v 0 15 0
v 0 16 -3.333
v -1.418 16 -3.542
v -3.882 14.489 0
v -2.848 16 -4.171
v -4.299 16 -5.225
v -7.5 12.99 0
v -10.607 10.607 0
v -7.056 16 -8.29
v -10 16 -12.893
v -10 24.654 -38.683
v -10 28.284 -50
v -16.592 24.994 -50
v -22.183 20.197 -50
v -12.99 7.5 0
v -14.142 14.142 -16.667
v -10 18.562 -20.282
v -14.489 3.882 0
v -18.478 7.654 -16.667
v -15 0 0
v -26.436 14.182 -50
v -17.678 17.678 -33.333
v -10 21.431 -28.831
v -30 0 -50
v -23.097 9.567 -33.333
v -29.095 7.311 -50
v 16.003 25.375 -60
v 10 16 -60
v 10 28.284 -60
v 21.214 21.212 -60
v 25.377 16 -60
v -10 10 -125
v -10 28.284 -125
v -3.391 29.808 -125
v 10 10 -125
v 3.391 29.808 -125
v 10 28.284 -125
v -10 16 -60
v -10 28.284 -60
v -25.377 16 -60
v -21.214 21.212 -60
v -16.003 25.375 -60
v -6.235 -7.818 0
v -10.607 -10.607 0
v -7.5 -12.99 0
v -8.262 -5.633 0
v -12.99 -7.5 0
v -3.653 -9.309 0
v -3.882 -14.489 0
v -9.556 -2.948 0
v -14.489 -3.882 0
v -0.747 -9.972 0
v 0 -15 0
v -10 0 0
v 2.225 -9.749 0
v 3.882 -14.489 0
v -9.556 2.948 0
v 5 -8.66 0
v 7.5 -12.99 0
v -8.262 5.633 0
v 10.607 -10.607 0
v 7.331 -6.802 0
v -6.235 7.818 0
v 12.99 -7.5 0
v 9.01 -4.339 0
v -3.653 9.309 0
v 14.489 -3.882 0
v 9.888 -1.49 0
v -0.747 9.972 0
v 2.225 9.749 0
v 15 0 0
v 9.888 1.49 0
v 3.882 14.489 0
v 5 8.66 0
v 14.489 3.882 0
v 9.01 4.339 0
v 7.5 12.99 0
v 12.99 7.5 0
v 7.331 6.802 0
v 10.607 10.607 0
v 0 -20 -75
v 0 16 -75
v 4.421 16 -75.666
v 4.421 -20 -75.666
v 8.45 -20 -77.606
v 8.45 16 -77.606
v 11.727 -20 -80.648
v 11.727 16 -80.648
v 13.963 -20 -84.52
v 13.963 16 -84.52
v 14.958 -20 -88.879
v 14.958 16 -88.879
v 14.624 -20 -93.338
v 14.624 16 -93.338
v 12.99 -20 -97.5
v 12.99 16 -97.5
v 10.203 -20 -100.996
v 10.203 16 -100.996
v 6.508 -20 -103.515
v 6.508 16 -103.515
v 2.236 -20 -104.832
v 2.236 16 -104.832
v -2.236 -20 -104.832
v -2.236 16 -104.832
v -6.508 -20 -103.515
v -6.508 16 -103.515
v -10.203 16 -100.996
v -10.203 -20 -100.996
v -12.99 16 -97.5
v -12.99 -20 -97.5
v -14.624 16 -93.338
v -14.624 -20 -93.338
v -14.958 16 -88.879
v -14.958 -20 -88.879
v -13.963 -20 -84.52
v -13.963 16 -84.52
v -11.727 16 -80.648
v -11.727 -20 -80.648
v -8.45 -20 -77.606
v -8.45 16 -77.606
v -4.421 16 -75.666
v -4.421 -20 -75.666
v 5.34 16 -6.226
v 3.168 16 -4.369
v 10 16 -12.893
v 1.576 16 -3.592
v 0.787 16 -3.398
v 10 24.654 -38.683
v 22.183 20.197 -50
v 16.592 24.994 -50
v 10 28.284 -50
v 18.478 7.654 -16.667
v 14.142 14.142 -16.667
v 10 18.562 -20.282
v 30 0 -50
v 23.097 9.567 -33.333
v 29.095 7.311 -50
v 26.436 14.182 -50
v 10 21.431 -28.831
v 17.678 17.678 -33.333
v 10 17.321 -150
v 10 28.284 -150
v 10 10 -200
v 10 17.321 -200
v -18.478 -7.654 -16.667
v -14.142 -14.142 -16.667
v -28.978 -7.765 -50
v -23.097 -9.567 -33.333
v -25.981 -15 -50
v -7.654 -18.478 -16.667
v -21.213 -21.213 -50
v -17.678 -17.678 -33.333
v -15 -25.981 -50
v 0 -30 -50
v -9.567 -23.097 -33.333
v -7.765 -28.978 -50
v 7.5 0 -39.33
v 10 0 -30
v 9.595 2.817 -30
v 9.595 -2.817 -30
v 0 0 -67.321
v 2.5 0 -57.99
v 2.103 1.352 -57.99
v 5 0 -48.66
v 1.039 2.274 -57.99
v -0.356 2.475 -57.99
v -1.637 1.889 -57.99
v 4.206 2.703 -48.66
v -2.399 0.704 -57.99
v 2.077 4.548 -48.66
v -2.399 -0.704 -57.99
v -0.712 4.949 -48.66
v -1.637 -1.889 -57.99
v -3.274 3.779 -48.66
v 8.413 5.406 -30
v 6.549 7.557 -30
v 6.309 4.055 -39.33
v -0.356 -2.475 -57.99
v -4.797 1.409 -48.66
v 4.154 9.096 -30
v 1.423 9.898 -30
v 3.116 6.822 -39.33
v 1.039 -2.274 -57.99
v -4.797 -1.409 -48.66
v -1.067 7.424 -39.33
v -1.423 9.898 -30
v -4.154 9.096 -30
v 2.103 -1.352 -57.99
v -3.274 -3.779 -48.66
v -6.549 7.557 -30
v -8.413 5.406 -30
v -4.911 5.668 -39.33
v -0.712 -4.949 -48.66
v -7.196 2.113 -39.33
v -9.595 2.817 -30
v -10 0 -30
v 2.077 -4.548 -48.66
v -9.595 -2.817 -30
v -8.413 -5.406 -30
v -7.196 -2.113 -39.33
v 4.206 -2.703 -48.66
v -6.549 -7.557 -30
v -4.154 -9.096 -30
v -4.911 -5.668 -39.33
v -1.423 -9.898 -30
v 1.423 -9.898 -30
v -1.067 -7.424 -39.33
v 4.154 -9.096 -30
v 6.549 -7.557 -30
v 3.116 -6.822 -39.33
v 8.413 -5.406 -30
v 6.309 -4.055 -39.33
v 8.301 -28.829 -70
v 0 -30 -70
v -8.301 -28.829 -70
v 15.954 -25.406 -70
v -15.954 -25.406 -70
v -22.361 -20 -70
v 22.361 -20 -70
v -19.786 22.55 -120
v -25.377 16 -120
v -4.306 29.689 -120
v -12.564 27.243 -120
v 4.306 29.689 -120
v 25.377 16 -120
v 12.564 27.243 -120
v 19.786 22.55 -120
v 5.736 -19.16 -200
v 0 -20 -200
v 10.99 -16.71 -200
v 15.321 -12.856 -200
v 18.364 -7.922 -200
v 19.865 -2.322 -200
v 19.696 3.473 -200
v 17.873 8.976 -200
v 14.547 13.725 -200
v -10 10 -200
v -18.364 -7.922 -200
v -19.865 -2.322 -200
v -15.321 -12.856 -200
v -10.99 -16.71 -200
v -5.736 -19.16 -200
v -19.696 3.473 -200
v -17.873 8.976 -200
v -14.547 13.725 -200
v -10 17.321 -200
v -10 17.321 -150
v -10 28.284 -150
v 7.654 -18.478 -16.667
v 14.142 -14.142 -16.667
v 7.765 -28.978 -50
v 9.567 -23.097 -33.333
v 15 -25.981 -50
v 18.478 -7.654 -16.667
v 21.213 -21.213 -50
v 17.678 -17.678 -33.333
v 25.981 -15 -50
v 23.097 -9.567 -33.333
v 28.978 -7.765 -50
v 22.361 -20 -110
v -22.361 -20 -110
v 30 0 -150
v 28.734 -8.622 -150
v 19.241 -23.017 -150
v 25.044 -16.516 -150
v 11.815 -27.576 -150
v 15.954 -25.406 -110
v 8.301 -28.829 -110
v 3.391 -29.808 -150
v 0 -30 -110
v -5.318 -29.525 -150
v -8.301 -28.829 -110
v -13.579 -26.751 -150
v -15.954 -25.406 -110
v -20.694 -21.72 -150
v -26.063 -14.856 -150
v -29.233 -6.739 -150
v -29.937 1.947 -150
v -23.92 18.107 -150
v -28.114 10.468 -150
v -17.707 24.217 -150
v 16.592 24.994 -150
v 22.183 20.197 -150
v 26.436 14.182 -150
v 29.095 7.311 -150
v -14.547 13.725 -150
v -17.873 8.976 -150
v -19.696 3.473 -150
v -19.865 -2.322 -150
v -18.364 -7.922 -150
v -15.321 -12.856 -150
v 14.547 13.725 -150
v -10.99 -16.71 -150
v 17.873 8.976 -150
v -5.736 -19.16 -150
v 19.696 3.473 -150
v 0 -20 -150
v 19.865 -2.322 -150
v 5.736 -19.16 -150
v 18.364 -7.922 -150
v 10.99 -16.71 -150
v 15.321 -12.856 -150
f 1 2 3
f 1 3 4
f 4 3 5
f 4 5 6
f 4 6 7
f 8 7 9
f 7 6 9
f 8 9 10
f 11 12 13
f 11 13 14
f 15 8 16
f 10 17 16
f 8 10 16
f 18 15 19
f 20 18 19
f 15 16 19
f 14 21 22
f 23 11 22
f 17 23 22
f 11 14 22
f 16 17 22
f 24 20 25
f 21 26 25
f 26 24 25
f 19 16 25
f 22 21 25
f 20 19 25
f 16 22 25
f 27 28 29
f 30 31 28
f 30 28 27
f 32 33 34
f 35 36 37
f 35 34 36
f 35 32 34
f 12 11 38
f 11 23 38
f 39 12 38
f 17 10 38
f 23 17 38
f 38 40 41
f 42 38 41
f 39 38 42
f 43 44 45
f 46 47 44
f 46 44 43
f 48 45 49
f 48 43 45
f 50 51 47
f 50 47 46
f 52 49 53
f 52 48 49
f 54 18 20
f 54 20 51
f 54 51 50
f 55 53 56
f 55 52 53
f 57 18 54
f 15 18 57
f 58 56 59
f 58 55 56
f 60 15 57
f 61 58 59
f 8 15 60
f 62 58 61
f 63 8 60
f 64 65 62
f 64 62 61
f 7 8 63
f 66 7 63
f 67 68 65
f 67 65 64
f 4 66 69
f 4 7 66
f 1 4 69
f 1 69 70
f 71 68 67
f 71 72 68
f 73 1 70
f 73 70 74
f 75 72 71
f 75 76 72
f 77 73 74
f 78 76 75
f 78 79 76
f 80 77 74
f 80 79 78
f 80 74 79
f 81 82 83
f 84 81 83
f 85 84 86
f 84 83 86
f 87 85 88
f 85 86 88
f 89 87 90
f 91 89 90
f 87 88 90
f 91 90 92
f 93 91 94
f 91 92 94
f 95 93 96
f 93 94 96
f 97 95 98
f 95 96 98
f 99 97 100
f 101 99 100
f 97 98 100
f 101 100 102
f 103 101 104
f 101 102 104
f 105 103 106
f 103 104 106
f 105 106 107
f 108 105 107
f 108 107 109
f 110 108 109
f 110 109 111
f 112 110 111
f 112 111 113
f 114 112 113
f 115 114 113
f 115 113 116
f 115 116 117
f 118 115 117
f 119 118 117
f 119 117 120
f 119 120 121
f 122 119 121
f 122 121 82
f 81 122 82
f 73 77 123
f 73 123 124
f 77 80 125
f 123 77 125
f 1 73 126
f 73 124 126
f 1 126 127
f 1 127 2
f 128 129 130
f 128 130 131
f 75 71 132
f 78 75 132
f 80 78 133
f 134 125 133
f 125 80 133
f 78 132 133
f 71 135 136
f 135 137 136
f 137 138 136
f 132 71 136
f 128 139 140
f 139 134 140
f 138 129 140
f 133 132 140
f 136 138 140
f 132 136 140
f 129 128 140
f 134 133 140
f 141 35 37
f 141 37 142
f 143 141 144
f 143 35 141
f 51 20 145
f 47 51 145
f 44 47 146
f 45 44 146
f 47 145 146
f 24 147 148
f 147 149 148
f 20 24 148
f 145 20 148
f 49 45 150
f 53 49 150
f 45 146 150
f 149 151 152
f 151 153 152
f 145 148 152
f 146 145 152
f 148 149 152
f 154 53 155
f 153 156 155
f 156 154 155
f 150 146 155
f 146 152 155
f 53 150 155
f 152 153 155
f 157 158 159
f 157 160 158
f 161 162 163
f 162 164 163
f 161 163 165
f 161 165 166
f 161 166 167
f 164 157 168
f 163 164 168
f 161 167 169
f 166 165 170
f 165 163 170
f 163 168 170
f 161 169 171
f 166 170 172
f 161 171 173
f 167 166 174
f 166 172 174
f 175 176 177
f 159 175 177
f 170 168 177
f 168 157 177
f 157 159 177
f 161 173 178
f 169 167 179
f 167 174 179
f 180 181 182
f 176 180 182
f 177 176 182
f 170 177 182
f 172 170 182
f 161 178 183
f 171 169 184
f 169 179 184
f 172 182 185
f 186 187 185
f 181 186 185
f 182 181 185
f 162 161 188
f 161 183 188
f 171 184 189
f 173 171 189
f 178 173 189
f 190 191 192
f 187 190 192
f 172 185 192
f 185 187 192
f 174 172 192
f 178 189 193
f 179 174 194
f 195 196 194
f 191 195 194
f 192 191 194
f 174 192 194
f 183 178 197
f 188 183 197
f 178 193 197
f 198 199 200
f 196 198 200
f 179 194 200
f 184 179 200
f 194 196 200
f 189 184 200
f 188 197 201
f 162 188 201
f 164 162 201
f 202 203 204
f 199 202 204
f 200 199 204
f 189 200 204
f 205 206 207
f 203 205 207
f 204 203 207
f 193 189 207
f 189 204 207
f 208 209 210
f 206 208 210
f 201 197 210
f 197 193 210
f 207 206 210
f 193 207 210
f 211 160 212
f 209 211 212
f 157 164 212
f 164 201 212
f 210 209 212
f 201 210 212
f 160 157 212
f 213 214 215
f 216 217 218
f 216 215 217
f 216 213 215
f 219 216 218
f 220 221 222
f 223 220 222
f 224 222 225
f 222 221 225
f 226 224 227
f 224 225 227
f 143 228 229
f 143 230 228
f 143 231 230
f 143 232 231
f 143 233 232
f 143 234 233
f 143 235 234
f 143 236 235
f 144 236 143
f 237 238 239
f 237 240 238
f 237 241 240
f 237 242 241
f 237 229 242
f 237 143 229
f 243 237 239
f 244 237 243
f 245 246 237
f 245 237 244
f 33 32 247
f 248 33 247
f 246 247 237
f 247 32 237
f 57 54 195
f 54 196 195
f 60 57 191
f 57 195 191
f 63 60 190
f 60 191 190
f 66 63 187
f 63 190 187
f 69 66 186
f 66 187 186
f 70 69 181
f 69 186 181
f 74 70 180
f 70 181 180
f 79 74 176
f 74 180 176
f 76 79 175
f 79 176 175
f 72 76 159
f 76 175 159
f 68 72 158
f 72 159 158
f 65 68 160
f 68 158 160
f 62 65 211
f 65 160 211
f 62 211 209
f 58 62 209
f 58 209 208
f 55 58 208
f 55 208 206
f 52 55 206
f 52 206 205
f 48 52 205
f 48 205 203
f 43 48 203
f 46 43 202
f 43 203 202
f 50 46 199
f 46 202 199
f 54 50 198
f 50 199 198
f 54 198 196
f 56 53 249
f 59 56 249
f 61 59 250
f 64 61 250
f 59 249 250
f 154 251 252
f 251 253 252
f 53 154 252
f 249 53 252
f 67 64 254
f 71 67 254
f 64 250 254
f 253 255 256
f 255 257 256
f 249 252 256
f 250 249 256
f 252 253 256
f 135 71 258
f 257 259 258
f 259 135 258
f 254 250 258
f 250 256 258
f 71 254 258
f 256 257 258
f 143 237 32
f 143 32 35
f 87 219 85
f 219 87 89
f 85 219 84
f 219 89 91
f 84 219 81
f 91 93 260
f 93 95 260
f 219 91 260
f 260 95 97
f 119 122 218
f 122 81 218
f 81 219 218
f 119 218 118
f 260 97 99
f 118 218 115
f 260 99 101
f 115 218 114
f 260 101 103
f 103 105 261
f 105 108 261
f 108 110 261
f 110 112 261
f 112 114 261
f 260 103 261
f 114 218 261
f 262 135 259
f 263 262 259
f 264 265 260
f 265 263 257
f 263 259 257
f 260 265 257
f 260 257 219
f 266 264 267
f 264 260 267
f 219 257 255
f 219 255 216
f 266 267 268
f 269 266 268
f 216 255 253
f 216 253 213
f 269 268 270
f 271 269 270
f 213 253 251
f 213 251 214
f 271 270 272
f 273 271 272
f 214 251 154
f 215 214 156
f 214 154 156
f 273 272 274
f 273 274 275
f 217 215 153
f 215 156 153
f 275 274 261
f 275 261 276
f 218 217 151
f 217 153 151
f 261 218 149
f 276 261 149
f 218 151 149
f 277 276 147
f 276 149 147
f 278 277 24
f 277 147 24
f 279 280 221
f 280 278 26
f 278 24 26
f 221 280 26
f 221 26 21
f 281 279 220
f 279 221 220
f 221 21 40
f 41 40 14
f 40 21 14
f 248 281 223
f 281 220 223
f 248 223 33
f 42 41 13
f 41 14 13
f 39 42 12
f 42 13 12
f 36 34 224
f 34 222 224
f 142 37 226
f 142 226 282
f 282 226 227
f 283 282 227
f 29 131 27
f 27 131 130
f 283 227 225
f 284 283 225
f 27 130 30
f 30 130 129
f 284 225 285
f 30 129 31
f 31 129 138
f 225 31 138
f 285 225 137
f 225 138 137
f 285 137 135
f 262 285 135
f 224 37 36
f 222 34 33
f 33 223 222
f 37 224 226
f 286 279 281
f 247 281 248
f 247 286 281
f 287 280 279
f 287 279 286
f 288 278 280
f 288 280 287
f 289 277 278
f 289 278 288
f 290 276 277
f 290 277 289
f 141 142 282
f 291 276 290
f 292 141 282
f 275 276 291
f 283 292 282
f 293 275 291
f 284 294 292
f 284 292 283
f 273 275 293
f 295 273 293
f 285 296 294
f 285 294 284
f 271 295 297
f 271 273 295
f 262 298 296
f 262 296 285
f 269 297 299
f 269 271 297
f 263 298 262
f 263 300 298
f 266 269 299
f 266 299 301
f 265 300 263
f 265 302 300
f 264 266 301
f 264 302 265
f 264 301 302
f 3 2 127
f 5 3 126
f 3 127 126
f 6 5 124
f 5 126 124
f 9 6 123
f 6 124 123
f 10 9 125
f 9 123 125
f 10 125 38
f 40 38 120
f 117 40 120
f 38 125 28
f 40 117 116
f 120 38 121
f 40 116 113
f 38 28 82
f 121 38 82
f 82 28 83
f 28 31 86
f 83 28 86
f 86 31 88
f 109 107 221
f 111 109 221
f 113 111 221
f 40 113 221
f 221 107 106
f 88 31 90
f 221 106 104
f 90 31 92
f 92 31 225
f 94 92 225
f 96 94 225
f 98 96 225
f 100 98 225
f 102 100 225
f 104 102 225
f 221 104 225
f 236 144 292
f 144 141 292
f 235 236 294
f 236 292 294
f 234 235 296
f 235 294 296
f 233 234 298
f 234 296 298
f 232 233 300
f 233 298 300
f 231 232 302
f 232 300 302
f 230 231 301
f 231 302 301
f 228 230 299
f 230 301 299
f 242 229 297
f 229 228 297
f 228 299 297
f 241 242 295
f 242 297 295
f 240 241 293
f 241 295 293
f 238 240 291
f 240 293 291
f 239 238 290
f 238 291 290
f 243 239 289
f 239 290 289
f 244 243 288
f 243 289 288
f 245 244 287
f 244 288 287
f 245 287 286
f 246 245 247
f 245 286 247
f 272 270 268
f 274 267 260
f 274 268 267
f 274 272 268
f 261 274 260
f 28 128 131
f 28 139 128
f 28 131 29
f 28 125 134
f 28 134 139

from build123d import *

# Parameters (mm, degrees)
SKETCH2_R                           = 30
BOSS_EXTRUDE1_DEPTH                 = 50
SKETCH4_R                           = 30
BOSS_EXTRUDE4_DEPTH                 = 100
CUT_EXTRUDE3_REACH                  = 157.885
CUT_EXTRUDE3_END_RADIUS             = 30
SKETCH20_W                          = 60
SKETCH20_H                          = 14
SKETCH20_W_2                        = 40
SKETCH20_H_2                        = 10
CUT_EXTRUDE3_DIRECTION_2_REACH      = 157.885
CUT_EXTRUDE3_DIRECTION_2_END_RADIUS = 30
SKETCH8_R                           = 20
BOSS_EXTRUDE6_DEPTH                 = 50
CUT_EXTRUDE14_REACH                 = 209.403
CUT_EXTRUDE14_END_RADIUS            = 30
SKETCH22_W                          = 20
SKETCH22_H                          = 60
CUT_EXTRUDE16_REACH                 = 208.155
CUT_EXTRUDE16_END_RADIUS            = 30
SKETCH23_W                          = 20
SKETCH23_H                          = 75
V_0_377_DIAMETER_HOLE2_D            = 19.999999878
V_0_377_DIAMETER_HOLE2_DEPTH        = 30
V_0_377_DIAMETER_HOLE2_TIP          = 37.320507848
CUT_EXTRUDE17_REACH                 = 209.403
SKETCH26_R                          = 15


with BuildPart() as part:
    # Sketch2 → Boss-Extrude1 (new body)
    with BuildSketch(Plane.XY):
        Circle(SKETCH2_R)
    extrude(amount=-BOSS_EXTRUDE1_DEPTH)

    # Sketch4 → Boss-Extrude4 (add)
    with BuildSketch(Plane(origin=(0, 0, -50), x_dir=(-1, 0, 0), z_dir=(0, 0, -1))):
        with Locations(Location((0, 0, 0), (0, 0, 180))):
            Circle(SKETCH4_R)
    extrude(amount=BOSS_EXTRUDE4_DEPTH)

    # Cut-Sweep1: sweep along a curve in space
    with BuildLine() as cut_sweep1_path:
        ThreePointArc((30, 0, 0), (21.213203436, 21.213203436, 0), (0, 30, 0))
        ThreePointArc((0, 30, 0), (-21.213203436, 21.213203436, 0), (-30, 0, 0))
        ThreePointArc((-30, 0, 0), (-21.213203436, -21.213203436, 0), (0, -30, 0))
        ThreePointArc((0, -30, 0), (21.213203436, -21.213203436, 0), (30, 0, 0))
    # Sketch11 → Cut-Sweep1 (sweep, cut)
    with BuildSketch(Plane(origin=(0, 0, 0), x_dir=(0, 0, -1), z_dir=(1, 0, 0))):
        Polygon((0, 15), (50, 30), (0, 30), align=None)
    sweep(path=cut_sweep1_path.line, mode=Mode.SUBTRACT)

    # Cut-Extrude3: up to this cylinder (the profile starts inside it)
    cut_extrude3_end = Plane(origin=(0, 0, -90), z_dir=(0, 0, 1)) * Cylinder(CUT_EXTRUDE3_END_RADIUS, 376.77, mode=Mode.PRIVATE)
    # Sketch20 → Cut-Extrude3 (cut, up to the surface)
    with BuildSketch(Plane(origin=(0, 0, 0), x_dir=(0, 0, -1), z_dir=(1, 0, 0)), mode=Mode.PRIVATE) as cut_extrude3_sk1:
        with Locations((90, 23)):
            Rectangle(SKETCH20_W, SKETCH20_H)
    cut_extrude3_tool1 = extrude(cut_extrude3_sk1.sketch, amount=-CUT_EXTRUDE3_REACH, mode=Mode.PRIVATE) & cut_extrude3_end
    add(cut_extrude3_tool1.solids().sort_by_distance((0, 23, -90))[0], mode=Mode.SUBTRACT)
    # Sketch20 → Cut-Extrude3 (cut, up to the surface)
    with BuildSketch(Plane(origin=(0, 0, 0), x_dir=(0, 0, -1), z_dir=(1, 0, 0)), mode=Mode.PRIVATE) as cut_extrude3_sk2:
        with Locations((90, -25)):
            Rectangle(SKETCH20_W_2, SKETCH20_H_2)
    cut_extrude3_tool2 = extrude(cut_extrude3_sk2.sketch, amount=-CUT_EXTRUDE3_REACH, mode=Mode.PRIVATE) & cut_extrude3_end
    add(cut_extrude3_tool2.solids().sort_by_distance((0, -25, -90))[0], mode=Mode.SUBTRACT)

    # Cut-Extrude3 direction 2: up to this cylinder (the profile starts inside it)
    cut_extrude3_direction_2_end = Plane(origin=(0, 0, -90), z_dir=(0, 0, 1)) * Cylinder(CUT_EXTRUDE3_DIRECTION_2_END_RADIUS, 376.77, mode=Mode.PRIVATE)
    # Sketch20 → Cut-Extrude3 direction 2 (cut, up to the surface)
    with BuildSketch(Plane(origin=(0, 0, 0), x_dir=(0, 0, -1), z_dir=(1, 0, 0)), mode=Mode.PRIVATE) as cut_extrude3_direction_2_sk1:
        with Locations((90, 23)):
            Rectangle(SKETCH20_W, SKETCH20_H)
    cut_extrude3_direction_2_tool1 = extrude(cut_extrude3_direction_2_sk1.sketch, amount=CUT_EXTRUDE3_DIRECTION_2_REACH, mode=Mode.PRIVATE) & cut_extrude3_direction_2_end
    add(cut_extrude3_direction_2_tool1.solids().sort_by_distance((0, 23, -90))[0], mode=Mode.SUBTRACT)
    # Sketch20 → Cut-Extrude3 direction 2 (cut, up to the surface)
    with BuildSketch(Plane(origin=(0, 0, 0), x_dir=(0, 0, -1), z_dir=(1, 0, 0)), mode=Mode.PRIVATE) as cut_extrude3_direction_2_sk2:
        with Locations((90, -25)):
            Rectangle(SKETCH20_W_2, SKETCH20_H_2)
    cut_extrude3_direction_2_tool2 = extrude(cut_extrude3_direction_2_sk2.sketch, amount=CUT_EXTRUDE3_DIRECTION_2_REACH, mode=Mode.PRIVATE) & cut_extrude3_direction_2_end
    add(cut_extrude3_direction_2_tool2.solids().sort_by_distance((0, -25, -90))[0], mode=Mode.SUBTRACT)

    # Sketch8 → Boss-Extrude6 (add)
    with BuildSketch(Plane(origin=(0, 0, -150), x_dir=(-1, 0, 0), z_dir=(0, 0, -1))):
        Circle(SKETCH8_R)
    extrude(amount=BOSS_EXTRUDE6_DEPTH)

    # Cut-Extrude14: up to this cylinder (the profile starts inside it)
    cut_extrude14_end = Plane(origin=(0, 0, -30), z_dir=(0, 0, 1)) * Cylinder(CUT_EXTRUDE14_END_RADIUS, 479.806, mode=Mode.PRIVATE)
    # Sketch22 → Cut-Extrude14 (cut, up to the surface)
    with BuildSketch(Plane(origin=(0, 16, 0), x_dir=(1, 0, 0), z_dir=(0, 1, 0)), mode=Mode.PRIVATE) as cut_extrude14_sk1:
        with Locations((0, 30)):
            Rectangle(SKETCH22_W, SKETCH22_H)
    cut_extrude14_tool1 = extrude(cut_extrude14_sk1.sketch, amount=CUT_EXTRUDE14_REACH, mode=Mode.PRIVATE) & cut_extrude14_end
    add(cut_extrude14_tool1.solids().sort_by_distance((0, 16, -30))[0], mode=Mode.SUBTRACT)

    # Cut-Extrude16: up to this cylinder (the profile starts inside it)
    cut_extrude16_end = Plane(origin=(0, 0, -162.5), z_dir=(0, 0, 1)) * Cylinder(CUT_EXTRUDE16_END_RADIUS, 477.31, mode=Mode.PRIVATE)
    # Sketch23 → Cut-Extrude16 (cut, up to the surface)
    with BuildSketch(Plane(origin=(0, 10, 0), x_dir=(1, 0, 0), z_dir=(0, 1, 0)), mode=Mode.PRIVATE) as cut_extrude16_sk1:
        with Locations((0, 162.5)):
            Rectangle(SKETCH23_W, SKETCH23_H)
    cut_extrude16_tool1 = extrude(cut_extrude16_sk1.sketch, amount=CUT_EXTRUDE16_REACH, mode=Mode.PRIVATE) & cut_extrude16_end
    add(cut_extrude16_tool1.solids().sort_by_distance((0, 10, -162.5))[0], mode=Mode.SUBTRACT)

    # V (0.377) Diameter Hole2
    with Locations(Plane.XY):
        with Locations((0, 0)):
            Hole(V_0_377_DIAMETER_HOLE2_D / 2, depth=V_0_377_DIAMETER_HOLE2_DEPTH)
            with Locations((0, 0, -(V_0_377_DIAMETER_HOLE2_DEPTH + V_0_377_DIAMETER_HOLE2_TIP / 2))):  # 30° drill point
                Cone(0, V_0_377_DIAMETER_HOLE2_D / 2, V_0_377_DIAMETER_HOLE2_TIP, mode=Mode.SUBTRACT)

    # Sketch26 → Cut-Extrude17 (cut, up to next)
    with BuildSketch(Plane(origin=(0, 16, 0), x_dir=(1, 0, 0), z_dir=(0, 1, 0)), mode=Mode.PRIVATE) as cut_extrude17_sk1:
        with Locations(Location((0, 90, 0), (0, 0, 270))):
            Circle(SKETCH26_R)
    cut_extrude17_tool1 = extrude(cut_extrude17_sk1.sketch, amount=-CUT_EXTRUDE17_REACH, mode=Mode.PRIVATE) & part.part
    add(cut_extrude17_tool1.solids().sort_by_distance((0, 16, -90))[0], mode=Mode.SUBTRACT)


solid = part.part
